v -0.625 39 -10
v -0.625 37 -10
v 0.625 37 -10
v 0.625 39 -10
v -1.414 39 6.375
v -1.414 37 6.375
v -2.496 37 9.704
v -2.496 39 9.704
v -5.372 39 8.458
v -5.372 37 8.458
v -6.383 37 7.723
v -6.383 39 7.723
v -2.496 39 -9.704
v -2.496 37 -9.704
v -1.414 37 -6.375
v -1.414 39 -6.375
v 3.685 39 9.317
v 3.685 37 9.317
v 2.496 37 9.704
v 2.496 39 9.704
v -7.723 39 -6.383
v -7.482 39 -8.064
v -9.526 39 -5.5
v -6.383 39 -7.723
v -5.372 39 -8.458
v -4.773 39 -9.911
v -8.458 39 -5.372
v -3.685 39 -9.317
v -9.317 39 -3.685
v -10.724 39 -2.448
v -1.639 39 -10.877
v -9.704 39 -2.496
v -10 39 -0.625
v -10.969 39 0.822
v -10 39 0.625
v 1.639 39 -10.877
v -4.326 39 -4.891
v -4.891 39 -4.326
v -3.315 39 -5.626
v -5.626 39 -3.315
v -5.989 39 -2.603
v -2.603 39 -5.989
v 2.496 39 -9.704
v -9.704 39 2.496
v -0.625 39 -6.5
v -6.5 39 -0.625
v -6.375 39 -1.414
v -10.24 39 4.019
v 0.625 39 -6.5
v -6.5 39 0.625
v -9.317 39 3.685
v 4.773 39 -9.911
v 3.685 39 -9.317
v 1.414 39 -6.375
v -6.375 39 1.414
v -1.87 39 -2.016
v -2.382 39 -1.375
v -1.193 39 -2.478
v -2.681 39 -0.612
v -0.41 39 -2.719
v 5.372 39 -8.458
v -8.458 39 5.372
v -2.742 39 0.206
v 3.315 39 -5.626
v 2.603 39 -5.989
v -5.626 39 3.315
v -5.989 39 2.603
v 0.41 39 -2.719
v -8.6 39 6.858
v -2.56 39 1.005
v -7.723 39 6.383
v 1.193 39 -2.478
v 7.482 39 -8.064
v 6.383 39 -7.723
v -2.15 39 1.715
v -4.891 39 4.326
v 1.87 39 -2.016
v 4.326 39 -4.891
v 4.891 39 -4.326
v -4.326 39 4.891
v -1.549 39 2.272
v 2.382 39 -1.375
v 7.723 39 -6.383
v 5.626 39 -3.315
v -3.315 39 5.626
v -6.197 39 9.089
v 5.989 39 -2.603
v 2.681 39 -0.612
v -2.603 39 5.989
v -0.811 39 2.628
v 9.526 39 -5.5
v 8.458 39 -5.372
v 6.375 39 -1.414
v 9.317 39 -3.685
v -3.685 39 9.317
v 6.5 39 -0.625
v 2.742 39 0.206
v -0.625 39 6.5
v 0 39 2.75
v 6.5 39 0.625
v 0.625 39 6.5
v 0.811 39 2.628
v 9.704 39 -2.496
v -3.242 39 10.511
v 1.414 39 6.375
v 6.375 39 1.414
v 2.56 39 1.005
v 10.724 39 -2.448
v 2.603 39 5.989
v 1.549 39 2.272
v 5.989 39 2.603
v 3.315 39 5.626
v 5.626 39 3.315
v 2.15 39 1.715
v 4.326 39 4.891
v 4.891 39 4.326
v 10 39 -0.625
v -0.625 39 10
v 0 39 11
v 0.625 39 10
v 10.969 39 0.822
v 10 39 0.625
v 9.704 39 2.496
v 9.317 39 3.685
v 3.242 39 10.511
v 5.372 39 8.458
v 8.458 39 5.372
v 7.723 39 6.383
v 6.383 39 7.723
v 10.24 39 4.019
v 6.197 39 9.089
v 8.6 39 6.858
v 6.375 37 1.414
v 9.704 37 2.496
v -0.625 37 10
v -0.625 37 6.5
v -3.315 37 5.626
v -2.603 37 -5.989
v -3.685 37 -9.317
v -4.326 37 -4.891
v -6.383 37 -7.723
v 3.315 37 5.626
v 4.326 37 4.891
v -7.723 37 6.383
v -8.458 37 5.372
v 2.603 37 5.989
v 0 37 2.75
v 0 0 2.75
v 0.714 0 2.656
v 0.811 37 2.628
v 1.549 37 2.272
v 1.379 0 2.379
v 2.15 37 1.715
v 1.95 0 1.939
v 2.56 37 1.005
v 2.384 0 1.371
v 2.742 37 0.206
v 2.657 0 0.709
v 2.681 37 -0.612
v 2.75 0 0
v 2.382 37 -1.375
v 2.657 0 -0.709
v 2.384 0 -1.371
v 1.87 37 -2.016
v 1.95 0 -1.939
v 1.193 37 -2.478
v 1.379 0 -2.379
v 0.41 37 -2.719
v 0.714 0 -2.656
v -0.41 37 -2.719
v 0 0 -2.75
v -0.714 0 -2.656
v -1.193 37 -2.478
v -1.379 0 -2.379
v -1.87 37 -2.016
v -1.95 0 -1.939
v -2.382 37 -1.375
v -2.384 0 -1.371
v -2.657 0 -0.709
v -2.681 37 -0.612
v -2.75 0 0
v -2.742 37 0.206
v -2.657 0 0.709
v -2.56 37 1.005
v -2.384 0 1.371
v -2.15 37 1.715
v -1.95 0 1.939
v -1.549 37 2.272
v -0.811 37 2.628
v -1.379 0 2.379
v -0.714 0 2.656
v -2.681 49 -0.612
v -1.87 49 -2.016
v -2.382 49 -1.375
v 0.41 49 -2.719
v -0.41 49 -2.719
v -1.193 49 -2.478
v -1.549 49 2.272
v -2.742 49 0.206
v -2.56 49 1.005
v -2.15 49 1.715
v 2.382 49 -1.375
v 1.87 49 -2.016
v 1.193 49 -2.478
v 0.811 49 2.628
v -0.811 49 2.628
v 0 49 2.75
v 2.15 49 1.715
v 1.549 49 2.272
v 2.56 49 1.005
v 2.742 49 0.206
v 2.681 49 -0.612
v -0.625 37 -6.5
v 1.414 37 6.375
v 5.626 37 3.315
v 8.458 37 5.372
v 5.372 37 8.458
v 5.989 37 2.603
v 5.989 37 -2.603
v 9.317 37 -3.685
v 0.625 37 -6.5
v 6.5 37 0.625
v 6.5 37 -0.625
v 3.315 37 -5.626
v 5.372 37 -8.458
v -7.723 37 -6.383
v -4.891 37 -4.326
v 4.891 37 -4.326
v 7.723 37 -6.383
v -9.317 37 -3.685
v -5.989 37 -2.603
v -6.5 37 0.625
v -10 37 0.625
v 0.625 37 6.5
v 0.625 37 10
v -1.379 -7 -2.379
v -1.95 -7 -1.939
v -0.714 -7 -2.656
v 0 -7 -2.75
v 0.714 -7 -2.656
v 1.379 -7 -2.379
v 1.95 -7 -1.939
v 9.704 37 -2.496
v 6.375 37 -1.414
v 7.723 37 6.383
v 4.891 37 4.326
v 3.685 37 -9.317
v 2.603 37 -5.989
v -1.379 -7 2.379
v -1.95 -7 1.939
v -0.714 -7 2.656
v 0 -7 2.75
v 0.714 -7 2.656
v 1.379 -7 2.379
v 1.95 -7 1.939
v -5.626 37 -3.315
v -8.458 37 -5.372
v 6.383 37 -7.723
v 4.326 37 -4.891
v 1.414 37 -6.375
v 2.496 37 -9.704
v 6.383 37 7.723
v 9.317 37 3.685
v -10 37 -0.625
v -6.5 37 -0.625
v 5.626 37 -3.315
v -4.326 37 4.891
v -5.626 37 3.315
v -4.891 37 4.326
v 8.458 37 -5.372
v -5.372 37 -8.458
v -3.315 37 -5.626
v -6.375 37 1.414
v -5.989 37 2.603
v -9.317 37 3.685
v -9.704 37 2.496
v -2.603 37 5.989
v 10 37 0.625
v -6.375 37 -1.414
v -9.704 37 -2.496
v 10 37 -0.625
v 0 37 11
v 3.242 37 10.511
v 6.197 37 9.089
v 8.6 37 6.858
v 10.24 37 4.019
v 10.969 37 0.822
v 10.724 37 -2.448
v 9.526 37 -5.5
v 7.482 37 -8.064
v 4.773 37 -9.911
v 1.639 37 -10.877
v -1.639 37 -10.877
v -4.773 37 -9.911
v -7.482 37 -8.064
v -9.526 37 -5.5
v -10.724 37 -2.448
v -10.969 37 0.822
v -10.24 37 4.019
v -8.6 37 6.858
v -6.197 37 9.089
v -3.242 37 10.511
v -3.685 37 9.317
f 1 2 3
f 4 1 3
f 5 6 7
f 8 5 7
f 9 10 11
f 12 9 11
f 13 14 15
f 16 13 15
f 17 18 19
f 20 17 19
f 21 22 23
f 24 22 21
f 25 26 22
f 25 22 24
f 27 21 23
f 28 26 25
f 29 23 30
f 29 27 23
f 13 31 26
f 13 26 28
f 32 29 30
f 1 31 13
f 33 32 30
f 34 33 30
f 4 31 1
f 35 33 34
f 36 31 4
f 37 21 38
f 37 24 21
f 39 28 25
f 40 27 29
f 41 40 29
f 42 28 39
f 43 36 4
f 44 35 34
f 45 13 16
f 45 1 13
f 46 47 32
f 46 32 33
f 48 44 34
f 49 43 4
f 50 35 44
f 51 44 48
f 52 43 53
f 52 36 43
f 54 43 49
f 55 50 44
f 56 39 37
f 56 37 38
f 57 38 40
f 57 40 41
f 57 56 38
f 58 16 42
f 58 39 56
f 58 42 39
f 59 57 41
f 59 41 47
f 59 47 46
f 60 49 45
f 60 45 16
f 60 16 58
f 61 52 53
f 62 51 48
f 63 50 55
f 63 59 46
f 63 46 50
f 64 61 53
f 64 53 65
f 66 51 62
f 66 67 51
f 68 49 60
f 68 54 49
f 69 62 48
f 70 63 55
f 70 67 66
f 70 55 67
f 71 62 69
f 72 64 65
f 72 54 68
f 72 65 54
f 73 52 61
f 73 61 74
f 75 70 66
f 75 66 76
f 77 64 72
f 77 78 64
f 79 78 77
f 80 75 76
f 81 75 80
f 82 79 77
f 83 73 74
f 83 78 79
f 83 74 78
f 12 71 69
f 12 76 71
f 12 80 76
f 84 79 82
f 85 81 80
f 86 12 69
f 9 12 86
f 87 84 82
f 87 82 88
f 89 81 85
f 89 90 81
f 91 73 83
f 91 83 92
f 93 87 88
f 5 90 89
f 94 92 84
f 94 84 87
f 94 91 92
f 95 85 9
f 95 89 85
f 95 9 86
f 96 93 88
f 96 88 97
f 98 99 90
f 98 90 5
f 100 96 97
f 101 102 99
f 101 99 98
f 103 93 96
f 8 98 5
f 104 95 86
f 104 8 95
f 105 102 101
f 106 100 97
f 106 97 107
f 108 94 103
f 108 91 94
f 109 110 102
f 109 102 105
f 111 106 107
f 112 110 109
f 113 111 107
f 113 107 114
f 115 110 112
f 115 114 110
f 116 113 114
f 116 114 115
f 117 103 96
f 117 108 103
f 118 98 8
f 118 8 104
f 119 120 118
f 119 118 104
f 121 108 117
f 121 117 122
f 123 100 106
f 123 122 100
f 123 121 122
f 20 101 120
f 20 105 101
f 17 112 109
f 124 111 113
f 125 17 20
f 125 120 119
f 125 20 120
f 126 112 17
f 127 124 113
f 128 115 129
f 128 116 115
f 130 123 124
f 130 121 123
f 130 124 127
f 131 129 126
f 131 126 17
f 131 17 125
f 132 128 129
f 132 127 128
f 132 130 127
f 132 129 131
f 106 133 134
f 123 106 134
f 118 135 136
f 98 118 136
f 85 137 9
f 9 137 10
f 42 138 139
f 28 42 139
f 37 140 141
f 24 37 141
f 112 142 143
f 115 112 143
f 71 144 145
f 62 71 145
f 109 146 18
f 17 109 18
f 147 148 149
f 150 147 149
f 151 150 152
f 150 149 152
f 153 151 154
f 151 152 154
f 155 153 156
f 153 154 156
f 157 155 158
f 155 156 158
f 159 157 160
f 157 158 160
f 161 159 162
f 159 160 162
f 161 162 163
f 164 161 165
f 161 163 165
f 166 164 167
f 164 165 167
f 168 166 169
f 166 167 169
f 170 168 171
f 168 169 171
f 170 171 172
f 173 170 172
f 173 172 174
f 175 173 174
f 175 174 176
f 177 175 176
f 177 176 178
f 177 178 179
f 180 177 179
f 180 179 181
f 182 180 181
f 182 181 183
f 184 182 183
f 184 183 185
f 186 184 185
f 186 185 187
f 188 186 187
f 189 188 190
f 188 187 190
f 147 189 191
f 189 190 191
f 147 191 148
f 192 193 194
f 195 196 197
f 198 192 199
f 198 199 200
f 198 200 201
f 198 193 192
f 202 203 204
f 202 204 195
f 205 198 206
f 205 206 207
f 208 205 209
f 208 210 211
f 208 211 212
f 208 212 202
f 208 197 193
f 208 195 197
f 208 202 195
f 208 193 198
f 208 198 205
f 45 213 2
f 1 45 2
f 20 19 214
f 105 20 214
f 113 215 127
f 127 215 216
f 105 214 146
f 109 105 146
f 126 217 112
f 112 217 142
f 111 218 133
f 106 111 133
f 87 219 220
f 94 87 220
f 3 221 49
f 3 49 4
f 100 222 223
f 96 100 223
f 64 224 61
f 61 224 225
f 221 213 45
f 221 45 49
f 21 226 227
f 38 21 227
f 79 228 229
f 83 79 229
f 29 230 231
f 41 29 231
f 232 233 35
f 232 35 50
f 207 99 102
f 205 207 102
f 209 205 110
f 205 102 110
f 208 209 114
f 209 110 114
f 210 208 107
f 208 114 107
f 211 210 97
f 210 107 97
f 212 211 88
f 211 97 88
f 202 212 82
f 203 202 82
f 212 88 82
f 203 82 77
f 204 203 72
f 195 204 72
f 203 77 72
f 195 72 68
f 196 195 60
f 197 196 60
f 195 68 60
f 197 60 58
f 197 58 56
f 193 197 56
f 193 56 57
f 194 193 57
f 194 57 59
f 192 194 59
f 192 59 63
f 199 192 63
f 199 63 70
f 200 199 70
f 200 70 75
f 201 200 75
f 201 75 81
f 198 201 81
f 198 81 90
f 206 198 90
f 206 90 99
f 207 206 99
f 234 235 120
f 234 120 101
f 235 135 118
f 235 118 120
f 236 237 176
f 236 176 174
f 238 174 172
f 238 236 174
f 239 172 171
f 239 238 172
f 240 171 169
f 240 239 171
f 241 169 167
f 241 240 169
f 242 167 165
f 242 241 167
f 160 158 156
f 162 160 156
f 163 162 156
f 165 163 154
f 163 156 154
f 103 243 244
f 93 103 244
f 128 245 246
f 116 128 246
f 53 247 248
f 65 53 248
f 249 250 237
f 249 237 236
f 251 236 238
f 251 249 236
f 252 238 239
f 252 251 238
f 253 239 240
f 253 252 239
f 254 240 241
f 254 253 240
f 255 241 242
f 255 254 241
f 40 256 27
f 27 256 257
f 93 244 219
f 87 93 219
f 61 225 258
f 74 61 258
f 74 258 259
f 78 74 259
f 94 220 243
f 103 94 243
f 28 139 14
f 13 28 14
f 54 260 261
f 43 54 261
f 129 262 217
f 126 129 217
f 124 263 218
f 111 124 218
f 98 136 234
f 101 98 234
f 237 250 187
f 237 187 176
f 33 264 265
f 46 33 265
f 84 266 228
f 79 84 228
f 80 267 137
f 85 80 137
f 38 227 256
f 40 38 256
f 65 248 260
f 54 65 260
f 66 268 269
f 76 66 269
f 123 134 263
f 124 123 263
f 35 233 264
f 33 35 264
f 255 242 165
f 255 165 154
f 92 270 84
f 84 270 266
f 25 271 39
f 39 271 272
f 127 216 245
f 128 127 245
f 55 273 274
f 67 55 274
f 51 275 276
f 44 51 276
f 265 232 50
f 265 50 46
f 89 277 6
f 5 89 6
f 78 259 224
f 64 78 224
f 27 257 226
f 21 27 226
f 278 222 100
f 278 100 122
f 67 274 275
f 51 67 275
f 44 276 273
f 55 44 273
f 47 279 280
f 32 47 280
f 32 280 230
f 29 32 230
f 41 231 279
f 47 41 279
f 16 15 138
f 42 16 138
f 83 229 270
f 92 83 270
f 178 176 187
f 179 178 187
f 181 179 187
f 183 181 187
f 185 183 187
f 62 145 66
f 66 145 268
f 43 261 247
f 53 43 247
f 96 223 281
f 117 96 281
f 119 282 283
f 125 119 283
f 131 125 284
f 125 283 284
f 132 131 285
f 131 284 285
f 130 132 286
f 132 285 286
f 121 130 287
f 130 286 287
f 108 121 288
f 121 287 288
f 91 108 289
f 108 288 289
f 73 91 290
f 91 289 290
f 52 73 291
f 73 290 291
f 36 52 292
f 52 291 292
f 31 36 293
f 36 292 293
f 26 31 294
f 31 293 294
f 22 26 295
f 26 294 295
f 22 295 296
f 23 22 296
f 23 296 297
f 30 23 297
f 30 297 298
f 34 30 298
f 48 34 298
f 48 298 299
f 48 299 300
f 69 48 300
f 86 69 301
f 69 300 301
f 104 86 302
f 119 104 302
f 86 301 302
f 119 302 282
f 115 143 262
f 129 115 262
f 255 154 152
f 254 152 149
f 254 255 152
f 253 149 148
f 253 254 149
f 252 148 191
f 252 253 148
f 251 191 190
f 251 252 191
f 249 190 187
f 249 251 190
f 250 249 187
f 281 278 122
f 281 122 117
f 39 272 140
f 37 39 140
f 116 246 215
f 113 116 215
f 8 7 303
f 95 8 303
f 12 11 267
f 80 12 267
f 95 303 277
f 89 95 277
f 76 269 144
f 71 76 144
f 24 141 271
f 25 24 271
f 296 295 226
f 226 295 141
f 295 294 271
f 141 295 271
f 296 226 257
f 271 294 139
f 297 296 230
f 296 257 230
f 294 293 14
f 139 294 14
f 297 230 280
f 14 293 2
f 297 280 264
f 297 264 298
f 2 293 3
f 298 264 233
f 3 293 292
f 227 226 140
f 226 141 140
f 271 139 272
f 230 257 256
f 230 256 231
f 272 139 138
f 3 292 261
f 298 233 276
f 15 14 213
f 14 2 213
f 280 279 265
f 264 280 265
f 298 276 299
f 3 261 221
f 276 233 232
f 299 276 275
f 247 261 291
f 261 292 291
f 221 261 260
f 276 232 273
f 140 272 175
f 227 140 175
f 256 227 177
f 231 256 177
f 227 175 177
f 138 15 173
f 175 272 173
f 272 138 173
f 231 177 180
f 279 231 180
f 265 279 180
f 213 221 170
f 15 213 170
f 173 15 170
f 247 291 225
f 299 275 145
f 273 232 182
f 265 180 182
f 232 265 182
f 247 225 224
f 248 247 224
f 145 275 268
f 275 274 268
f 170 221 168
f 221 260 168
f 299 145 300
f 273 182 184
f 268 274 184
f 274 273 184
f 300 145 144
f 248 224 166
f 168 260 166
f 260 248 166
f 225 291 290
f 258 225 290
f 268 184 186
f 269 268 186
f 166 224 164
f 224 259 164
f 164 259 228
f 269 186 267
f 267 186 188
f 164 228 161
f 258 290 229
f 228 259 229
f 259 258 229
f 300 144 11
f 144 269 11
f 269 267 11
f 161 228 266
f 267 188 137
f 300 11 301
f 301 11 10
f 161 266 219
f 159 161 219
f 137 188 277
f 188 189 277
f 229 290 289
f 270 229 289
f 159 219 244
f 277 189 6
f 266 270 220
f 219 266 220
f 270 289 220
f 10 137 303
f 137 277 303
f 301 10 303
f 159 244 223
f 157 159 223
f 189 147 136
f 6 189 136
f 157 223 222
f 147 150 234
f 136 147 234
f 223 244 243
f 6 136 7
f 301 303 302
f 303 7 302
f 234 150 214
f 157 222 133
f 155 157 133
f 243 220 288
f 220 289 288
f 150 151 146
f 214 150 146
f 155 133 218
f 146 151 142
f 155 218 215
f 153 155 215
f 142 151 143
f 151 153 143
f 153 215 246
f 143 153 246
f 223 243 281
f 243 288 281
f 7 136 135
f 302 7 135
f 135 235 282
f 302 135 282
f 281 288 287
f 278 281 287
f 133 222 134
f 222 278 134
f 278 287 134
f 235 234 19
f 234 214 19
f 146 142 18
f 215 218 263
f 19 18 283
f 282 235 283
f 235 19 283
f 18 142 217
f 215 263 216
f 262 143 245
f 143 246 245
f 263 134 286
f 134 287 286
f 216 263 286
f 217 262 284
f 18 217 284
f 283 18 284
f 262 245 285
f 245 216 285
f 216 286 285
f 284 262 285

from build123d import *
from build123d.topology import SkipClean

# Parameters (mm, degrees)
SKETCH_1_R      = 2.75
EXTRUDE_1_DEPTH = 49
EXTRUDE_START   = 7
EXTRUDE_2_DEPTH = 7
EXTRUDE_START_2 = -12
SKETCH_6_R      = 11
SKETCH_6_W      = 1.25
SKETCH_6_H      = 3.5
SKETCH_6_W_2    = 3.5
SKETCH_6_H_2    = 1.25
EXTRUDE_4_DEPTH = 2


with BuildPart() as part:
    # 草图1 → 凸台-拉伸1 (new body)
    with BuildSketch(Plane(origin=(0, 0, 0), x_dir=(1, 0, 0), z_dir=(0, 1, 0))):
        Circle(SKETCH_1_R)
    extrude(amount=EXTRUDE_1_DEPTH)

    # 草图2 → 凸台-拉伸2 (add)
    with SkipClean():  # the faces are left unmerged after this step: merging them gives an invalid solid
        with BuildSketch(Plane.XZ.offset(EXTRUDE_START)):
            with BuildLine():
                Line((-1.95, 1.939071943), (-1.95, -1.939071943))
                ThreePointArc((-1.95, -1.939071943), (0, -2.75), (1.95, -1.939071943))
                Line((1.95, -1.939071943), (1.95, 1.939071943))
                ThreePointArc((1.95, 1.939071943), (0, 2.75), (-1.95, 1.939071943))
            make_face()
        extrude(amount=-EXTRUDE_2_DEPTH)

    # 草图6 → 凸台-拉伸4 (add)
    with SkipClean():  # the faces are left unmerged after this step: merging them gives an invalid solid
        with BuildSketch(Plane(origin=(0, 49, 0), x_dir=(1, 0, 0), z_dir=(0, 1, 0)).offset(EXTRUDE_START_2)):
            Circle(SKETCH_6_R)
            Polygon((2.495759621, 9.703700784), (3.684580266, 9.317429541), (2.603020786, 5.988731734), (1.414200141, 6.375002977), align=None, mode=Mode.SUBTRACT)
            with Locations((0, 8.25)):
                Rectangle(SKETCH_6_W, SKETCH_6_H, mode=Mode.SUBTRACT)
            Polygon((5.372216901, 8.457535726), (6.383488144, 7.722804161), (4.326239761, 4.891244681), (3.314968518, 5.625976246), align=None, mode=Mode.SUBTRACT)
            Polygon((7.722804161, 6.383488144), (8.457535726, 5.372216901), (5.625976246, 3.314968518), (4.891244681, 4.326239761), align=None, mode=Mode.SUBTRACT)
            Polygon((9.317429541, 3.684580266), (9.703700784, 2.495759621), (6.375002977, 1.414200141), (5.988731734, 2.603020786), align=None, mode=Mode.SUBTRACT)
            with Locations((8.25, 0)):
                Rectangle(SKETCH_6_W_2, SKETCH_6_H_2, mode=Mode.SUBTRACT)
            Polygon((9.703700784, -2.495759621), (9.317429541, -3.684580266), (5.988731734, -2.603020786), (6.375002977, -1.414200141), align=None, mode=Mode.SUBTRACT)
            Polygon((8.457535726, -5.372216901), (7.722804161, -6.383488144), (4.891244681, -4.326239761), (5.625976246, -3.314968518), align=None, mode=Mode.SUBTRACT)
            Polygon((6.383488144, -7.722804161), (5.372216901, -8.457535726), (3.314968518, -5.625976246), (4.326239761, -4.891244681), align=None, mode=Mode.SUBTRACT)
            Polygon((3.684580266, -9.317429541), (2.495759621, -9.703700784), (1.414200141, -6.375002977), (2.603020786, -5.988731734), align=None, mode=Mode.SUBTRACT)
            with Locations((0, -8.25)):
                Rectangle(SKETCH_6_W, SKETCH_6_H, mode=Mode.SUBTRACT)
            Polygon((-2.495759621, -9.703700784), (-3.684580266, -9.317429541), (-2.603020786, -5.988731734), (-1.414200141, -6.375002977), align=None, mode=Mode.SUBTRACT)
            Polygon((-5.372216901, -8.457535726), (-6.383488144, -7.722804161), (-4.326239761, -4.891244681), (-3.314968518, -5.625976246), align=None, mode=Mode.SUBTRACT)
            Polygon((-7.722804161, -6.383488144), (-8.457535726, -5.372216901), (-5.625976246, -3.314968518), (-4.891244681, -4.326239761), align=None, mode=Mode.SUBTRACT)
            Polygon((-9.317429541, -3.684580266), (-9.703700784, -2.495759621), (-6.375002977, -1.414200141), (-5.988731734, -2.603020786), align=None, mode=Mode.SUBTRACT)
            with Locations((-8.25, 0)):
                Rectangle(SKETCH_6_W_2, SKETCH_6_H_2, mode=Mode.SUBTRACT)
            Polygon((-9.703700784, 2.495759621), (-9.317429541, 3.684580266), (-5.988731734, 2.603020786), (-6.375002977, 1.414200141), align=None, mode=Mode.SUBTRACT)
            Polygon((-8.457535726, 5.372216901), (-7.722804161, 6.383488144), (-4.891244681, 4.326239761), (-5.625976246, 3.314968518), align=None, mode=Mode.SUBTRACT)
            Polygon((-6.383488144, 7.722804161), (-5.372216901, 8.457535726), (-3.314968518, 5.625976246), (-4.326239761, 4.891244681), align=None, mode=Mode.SUBTRACT)
            Polygon((-3.684580266, 9.317429541), (-2.495759621, 9.703700784), (-1.414200141, 6.375002977), (-2.603020786, 5.988731734), align=None, mode=Mode.SUBTRACT)
        extrude(amount=EXTRUDE_4_DEPTH)


solid = part.part
